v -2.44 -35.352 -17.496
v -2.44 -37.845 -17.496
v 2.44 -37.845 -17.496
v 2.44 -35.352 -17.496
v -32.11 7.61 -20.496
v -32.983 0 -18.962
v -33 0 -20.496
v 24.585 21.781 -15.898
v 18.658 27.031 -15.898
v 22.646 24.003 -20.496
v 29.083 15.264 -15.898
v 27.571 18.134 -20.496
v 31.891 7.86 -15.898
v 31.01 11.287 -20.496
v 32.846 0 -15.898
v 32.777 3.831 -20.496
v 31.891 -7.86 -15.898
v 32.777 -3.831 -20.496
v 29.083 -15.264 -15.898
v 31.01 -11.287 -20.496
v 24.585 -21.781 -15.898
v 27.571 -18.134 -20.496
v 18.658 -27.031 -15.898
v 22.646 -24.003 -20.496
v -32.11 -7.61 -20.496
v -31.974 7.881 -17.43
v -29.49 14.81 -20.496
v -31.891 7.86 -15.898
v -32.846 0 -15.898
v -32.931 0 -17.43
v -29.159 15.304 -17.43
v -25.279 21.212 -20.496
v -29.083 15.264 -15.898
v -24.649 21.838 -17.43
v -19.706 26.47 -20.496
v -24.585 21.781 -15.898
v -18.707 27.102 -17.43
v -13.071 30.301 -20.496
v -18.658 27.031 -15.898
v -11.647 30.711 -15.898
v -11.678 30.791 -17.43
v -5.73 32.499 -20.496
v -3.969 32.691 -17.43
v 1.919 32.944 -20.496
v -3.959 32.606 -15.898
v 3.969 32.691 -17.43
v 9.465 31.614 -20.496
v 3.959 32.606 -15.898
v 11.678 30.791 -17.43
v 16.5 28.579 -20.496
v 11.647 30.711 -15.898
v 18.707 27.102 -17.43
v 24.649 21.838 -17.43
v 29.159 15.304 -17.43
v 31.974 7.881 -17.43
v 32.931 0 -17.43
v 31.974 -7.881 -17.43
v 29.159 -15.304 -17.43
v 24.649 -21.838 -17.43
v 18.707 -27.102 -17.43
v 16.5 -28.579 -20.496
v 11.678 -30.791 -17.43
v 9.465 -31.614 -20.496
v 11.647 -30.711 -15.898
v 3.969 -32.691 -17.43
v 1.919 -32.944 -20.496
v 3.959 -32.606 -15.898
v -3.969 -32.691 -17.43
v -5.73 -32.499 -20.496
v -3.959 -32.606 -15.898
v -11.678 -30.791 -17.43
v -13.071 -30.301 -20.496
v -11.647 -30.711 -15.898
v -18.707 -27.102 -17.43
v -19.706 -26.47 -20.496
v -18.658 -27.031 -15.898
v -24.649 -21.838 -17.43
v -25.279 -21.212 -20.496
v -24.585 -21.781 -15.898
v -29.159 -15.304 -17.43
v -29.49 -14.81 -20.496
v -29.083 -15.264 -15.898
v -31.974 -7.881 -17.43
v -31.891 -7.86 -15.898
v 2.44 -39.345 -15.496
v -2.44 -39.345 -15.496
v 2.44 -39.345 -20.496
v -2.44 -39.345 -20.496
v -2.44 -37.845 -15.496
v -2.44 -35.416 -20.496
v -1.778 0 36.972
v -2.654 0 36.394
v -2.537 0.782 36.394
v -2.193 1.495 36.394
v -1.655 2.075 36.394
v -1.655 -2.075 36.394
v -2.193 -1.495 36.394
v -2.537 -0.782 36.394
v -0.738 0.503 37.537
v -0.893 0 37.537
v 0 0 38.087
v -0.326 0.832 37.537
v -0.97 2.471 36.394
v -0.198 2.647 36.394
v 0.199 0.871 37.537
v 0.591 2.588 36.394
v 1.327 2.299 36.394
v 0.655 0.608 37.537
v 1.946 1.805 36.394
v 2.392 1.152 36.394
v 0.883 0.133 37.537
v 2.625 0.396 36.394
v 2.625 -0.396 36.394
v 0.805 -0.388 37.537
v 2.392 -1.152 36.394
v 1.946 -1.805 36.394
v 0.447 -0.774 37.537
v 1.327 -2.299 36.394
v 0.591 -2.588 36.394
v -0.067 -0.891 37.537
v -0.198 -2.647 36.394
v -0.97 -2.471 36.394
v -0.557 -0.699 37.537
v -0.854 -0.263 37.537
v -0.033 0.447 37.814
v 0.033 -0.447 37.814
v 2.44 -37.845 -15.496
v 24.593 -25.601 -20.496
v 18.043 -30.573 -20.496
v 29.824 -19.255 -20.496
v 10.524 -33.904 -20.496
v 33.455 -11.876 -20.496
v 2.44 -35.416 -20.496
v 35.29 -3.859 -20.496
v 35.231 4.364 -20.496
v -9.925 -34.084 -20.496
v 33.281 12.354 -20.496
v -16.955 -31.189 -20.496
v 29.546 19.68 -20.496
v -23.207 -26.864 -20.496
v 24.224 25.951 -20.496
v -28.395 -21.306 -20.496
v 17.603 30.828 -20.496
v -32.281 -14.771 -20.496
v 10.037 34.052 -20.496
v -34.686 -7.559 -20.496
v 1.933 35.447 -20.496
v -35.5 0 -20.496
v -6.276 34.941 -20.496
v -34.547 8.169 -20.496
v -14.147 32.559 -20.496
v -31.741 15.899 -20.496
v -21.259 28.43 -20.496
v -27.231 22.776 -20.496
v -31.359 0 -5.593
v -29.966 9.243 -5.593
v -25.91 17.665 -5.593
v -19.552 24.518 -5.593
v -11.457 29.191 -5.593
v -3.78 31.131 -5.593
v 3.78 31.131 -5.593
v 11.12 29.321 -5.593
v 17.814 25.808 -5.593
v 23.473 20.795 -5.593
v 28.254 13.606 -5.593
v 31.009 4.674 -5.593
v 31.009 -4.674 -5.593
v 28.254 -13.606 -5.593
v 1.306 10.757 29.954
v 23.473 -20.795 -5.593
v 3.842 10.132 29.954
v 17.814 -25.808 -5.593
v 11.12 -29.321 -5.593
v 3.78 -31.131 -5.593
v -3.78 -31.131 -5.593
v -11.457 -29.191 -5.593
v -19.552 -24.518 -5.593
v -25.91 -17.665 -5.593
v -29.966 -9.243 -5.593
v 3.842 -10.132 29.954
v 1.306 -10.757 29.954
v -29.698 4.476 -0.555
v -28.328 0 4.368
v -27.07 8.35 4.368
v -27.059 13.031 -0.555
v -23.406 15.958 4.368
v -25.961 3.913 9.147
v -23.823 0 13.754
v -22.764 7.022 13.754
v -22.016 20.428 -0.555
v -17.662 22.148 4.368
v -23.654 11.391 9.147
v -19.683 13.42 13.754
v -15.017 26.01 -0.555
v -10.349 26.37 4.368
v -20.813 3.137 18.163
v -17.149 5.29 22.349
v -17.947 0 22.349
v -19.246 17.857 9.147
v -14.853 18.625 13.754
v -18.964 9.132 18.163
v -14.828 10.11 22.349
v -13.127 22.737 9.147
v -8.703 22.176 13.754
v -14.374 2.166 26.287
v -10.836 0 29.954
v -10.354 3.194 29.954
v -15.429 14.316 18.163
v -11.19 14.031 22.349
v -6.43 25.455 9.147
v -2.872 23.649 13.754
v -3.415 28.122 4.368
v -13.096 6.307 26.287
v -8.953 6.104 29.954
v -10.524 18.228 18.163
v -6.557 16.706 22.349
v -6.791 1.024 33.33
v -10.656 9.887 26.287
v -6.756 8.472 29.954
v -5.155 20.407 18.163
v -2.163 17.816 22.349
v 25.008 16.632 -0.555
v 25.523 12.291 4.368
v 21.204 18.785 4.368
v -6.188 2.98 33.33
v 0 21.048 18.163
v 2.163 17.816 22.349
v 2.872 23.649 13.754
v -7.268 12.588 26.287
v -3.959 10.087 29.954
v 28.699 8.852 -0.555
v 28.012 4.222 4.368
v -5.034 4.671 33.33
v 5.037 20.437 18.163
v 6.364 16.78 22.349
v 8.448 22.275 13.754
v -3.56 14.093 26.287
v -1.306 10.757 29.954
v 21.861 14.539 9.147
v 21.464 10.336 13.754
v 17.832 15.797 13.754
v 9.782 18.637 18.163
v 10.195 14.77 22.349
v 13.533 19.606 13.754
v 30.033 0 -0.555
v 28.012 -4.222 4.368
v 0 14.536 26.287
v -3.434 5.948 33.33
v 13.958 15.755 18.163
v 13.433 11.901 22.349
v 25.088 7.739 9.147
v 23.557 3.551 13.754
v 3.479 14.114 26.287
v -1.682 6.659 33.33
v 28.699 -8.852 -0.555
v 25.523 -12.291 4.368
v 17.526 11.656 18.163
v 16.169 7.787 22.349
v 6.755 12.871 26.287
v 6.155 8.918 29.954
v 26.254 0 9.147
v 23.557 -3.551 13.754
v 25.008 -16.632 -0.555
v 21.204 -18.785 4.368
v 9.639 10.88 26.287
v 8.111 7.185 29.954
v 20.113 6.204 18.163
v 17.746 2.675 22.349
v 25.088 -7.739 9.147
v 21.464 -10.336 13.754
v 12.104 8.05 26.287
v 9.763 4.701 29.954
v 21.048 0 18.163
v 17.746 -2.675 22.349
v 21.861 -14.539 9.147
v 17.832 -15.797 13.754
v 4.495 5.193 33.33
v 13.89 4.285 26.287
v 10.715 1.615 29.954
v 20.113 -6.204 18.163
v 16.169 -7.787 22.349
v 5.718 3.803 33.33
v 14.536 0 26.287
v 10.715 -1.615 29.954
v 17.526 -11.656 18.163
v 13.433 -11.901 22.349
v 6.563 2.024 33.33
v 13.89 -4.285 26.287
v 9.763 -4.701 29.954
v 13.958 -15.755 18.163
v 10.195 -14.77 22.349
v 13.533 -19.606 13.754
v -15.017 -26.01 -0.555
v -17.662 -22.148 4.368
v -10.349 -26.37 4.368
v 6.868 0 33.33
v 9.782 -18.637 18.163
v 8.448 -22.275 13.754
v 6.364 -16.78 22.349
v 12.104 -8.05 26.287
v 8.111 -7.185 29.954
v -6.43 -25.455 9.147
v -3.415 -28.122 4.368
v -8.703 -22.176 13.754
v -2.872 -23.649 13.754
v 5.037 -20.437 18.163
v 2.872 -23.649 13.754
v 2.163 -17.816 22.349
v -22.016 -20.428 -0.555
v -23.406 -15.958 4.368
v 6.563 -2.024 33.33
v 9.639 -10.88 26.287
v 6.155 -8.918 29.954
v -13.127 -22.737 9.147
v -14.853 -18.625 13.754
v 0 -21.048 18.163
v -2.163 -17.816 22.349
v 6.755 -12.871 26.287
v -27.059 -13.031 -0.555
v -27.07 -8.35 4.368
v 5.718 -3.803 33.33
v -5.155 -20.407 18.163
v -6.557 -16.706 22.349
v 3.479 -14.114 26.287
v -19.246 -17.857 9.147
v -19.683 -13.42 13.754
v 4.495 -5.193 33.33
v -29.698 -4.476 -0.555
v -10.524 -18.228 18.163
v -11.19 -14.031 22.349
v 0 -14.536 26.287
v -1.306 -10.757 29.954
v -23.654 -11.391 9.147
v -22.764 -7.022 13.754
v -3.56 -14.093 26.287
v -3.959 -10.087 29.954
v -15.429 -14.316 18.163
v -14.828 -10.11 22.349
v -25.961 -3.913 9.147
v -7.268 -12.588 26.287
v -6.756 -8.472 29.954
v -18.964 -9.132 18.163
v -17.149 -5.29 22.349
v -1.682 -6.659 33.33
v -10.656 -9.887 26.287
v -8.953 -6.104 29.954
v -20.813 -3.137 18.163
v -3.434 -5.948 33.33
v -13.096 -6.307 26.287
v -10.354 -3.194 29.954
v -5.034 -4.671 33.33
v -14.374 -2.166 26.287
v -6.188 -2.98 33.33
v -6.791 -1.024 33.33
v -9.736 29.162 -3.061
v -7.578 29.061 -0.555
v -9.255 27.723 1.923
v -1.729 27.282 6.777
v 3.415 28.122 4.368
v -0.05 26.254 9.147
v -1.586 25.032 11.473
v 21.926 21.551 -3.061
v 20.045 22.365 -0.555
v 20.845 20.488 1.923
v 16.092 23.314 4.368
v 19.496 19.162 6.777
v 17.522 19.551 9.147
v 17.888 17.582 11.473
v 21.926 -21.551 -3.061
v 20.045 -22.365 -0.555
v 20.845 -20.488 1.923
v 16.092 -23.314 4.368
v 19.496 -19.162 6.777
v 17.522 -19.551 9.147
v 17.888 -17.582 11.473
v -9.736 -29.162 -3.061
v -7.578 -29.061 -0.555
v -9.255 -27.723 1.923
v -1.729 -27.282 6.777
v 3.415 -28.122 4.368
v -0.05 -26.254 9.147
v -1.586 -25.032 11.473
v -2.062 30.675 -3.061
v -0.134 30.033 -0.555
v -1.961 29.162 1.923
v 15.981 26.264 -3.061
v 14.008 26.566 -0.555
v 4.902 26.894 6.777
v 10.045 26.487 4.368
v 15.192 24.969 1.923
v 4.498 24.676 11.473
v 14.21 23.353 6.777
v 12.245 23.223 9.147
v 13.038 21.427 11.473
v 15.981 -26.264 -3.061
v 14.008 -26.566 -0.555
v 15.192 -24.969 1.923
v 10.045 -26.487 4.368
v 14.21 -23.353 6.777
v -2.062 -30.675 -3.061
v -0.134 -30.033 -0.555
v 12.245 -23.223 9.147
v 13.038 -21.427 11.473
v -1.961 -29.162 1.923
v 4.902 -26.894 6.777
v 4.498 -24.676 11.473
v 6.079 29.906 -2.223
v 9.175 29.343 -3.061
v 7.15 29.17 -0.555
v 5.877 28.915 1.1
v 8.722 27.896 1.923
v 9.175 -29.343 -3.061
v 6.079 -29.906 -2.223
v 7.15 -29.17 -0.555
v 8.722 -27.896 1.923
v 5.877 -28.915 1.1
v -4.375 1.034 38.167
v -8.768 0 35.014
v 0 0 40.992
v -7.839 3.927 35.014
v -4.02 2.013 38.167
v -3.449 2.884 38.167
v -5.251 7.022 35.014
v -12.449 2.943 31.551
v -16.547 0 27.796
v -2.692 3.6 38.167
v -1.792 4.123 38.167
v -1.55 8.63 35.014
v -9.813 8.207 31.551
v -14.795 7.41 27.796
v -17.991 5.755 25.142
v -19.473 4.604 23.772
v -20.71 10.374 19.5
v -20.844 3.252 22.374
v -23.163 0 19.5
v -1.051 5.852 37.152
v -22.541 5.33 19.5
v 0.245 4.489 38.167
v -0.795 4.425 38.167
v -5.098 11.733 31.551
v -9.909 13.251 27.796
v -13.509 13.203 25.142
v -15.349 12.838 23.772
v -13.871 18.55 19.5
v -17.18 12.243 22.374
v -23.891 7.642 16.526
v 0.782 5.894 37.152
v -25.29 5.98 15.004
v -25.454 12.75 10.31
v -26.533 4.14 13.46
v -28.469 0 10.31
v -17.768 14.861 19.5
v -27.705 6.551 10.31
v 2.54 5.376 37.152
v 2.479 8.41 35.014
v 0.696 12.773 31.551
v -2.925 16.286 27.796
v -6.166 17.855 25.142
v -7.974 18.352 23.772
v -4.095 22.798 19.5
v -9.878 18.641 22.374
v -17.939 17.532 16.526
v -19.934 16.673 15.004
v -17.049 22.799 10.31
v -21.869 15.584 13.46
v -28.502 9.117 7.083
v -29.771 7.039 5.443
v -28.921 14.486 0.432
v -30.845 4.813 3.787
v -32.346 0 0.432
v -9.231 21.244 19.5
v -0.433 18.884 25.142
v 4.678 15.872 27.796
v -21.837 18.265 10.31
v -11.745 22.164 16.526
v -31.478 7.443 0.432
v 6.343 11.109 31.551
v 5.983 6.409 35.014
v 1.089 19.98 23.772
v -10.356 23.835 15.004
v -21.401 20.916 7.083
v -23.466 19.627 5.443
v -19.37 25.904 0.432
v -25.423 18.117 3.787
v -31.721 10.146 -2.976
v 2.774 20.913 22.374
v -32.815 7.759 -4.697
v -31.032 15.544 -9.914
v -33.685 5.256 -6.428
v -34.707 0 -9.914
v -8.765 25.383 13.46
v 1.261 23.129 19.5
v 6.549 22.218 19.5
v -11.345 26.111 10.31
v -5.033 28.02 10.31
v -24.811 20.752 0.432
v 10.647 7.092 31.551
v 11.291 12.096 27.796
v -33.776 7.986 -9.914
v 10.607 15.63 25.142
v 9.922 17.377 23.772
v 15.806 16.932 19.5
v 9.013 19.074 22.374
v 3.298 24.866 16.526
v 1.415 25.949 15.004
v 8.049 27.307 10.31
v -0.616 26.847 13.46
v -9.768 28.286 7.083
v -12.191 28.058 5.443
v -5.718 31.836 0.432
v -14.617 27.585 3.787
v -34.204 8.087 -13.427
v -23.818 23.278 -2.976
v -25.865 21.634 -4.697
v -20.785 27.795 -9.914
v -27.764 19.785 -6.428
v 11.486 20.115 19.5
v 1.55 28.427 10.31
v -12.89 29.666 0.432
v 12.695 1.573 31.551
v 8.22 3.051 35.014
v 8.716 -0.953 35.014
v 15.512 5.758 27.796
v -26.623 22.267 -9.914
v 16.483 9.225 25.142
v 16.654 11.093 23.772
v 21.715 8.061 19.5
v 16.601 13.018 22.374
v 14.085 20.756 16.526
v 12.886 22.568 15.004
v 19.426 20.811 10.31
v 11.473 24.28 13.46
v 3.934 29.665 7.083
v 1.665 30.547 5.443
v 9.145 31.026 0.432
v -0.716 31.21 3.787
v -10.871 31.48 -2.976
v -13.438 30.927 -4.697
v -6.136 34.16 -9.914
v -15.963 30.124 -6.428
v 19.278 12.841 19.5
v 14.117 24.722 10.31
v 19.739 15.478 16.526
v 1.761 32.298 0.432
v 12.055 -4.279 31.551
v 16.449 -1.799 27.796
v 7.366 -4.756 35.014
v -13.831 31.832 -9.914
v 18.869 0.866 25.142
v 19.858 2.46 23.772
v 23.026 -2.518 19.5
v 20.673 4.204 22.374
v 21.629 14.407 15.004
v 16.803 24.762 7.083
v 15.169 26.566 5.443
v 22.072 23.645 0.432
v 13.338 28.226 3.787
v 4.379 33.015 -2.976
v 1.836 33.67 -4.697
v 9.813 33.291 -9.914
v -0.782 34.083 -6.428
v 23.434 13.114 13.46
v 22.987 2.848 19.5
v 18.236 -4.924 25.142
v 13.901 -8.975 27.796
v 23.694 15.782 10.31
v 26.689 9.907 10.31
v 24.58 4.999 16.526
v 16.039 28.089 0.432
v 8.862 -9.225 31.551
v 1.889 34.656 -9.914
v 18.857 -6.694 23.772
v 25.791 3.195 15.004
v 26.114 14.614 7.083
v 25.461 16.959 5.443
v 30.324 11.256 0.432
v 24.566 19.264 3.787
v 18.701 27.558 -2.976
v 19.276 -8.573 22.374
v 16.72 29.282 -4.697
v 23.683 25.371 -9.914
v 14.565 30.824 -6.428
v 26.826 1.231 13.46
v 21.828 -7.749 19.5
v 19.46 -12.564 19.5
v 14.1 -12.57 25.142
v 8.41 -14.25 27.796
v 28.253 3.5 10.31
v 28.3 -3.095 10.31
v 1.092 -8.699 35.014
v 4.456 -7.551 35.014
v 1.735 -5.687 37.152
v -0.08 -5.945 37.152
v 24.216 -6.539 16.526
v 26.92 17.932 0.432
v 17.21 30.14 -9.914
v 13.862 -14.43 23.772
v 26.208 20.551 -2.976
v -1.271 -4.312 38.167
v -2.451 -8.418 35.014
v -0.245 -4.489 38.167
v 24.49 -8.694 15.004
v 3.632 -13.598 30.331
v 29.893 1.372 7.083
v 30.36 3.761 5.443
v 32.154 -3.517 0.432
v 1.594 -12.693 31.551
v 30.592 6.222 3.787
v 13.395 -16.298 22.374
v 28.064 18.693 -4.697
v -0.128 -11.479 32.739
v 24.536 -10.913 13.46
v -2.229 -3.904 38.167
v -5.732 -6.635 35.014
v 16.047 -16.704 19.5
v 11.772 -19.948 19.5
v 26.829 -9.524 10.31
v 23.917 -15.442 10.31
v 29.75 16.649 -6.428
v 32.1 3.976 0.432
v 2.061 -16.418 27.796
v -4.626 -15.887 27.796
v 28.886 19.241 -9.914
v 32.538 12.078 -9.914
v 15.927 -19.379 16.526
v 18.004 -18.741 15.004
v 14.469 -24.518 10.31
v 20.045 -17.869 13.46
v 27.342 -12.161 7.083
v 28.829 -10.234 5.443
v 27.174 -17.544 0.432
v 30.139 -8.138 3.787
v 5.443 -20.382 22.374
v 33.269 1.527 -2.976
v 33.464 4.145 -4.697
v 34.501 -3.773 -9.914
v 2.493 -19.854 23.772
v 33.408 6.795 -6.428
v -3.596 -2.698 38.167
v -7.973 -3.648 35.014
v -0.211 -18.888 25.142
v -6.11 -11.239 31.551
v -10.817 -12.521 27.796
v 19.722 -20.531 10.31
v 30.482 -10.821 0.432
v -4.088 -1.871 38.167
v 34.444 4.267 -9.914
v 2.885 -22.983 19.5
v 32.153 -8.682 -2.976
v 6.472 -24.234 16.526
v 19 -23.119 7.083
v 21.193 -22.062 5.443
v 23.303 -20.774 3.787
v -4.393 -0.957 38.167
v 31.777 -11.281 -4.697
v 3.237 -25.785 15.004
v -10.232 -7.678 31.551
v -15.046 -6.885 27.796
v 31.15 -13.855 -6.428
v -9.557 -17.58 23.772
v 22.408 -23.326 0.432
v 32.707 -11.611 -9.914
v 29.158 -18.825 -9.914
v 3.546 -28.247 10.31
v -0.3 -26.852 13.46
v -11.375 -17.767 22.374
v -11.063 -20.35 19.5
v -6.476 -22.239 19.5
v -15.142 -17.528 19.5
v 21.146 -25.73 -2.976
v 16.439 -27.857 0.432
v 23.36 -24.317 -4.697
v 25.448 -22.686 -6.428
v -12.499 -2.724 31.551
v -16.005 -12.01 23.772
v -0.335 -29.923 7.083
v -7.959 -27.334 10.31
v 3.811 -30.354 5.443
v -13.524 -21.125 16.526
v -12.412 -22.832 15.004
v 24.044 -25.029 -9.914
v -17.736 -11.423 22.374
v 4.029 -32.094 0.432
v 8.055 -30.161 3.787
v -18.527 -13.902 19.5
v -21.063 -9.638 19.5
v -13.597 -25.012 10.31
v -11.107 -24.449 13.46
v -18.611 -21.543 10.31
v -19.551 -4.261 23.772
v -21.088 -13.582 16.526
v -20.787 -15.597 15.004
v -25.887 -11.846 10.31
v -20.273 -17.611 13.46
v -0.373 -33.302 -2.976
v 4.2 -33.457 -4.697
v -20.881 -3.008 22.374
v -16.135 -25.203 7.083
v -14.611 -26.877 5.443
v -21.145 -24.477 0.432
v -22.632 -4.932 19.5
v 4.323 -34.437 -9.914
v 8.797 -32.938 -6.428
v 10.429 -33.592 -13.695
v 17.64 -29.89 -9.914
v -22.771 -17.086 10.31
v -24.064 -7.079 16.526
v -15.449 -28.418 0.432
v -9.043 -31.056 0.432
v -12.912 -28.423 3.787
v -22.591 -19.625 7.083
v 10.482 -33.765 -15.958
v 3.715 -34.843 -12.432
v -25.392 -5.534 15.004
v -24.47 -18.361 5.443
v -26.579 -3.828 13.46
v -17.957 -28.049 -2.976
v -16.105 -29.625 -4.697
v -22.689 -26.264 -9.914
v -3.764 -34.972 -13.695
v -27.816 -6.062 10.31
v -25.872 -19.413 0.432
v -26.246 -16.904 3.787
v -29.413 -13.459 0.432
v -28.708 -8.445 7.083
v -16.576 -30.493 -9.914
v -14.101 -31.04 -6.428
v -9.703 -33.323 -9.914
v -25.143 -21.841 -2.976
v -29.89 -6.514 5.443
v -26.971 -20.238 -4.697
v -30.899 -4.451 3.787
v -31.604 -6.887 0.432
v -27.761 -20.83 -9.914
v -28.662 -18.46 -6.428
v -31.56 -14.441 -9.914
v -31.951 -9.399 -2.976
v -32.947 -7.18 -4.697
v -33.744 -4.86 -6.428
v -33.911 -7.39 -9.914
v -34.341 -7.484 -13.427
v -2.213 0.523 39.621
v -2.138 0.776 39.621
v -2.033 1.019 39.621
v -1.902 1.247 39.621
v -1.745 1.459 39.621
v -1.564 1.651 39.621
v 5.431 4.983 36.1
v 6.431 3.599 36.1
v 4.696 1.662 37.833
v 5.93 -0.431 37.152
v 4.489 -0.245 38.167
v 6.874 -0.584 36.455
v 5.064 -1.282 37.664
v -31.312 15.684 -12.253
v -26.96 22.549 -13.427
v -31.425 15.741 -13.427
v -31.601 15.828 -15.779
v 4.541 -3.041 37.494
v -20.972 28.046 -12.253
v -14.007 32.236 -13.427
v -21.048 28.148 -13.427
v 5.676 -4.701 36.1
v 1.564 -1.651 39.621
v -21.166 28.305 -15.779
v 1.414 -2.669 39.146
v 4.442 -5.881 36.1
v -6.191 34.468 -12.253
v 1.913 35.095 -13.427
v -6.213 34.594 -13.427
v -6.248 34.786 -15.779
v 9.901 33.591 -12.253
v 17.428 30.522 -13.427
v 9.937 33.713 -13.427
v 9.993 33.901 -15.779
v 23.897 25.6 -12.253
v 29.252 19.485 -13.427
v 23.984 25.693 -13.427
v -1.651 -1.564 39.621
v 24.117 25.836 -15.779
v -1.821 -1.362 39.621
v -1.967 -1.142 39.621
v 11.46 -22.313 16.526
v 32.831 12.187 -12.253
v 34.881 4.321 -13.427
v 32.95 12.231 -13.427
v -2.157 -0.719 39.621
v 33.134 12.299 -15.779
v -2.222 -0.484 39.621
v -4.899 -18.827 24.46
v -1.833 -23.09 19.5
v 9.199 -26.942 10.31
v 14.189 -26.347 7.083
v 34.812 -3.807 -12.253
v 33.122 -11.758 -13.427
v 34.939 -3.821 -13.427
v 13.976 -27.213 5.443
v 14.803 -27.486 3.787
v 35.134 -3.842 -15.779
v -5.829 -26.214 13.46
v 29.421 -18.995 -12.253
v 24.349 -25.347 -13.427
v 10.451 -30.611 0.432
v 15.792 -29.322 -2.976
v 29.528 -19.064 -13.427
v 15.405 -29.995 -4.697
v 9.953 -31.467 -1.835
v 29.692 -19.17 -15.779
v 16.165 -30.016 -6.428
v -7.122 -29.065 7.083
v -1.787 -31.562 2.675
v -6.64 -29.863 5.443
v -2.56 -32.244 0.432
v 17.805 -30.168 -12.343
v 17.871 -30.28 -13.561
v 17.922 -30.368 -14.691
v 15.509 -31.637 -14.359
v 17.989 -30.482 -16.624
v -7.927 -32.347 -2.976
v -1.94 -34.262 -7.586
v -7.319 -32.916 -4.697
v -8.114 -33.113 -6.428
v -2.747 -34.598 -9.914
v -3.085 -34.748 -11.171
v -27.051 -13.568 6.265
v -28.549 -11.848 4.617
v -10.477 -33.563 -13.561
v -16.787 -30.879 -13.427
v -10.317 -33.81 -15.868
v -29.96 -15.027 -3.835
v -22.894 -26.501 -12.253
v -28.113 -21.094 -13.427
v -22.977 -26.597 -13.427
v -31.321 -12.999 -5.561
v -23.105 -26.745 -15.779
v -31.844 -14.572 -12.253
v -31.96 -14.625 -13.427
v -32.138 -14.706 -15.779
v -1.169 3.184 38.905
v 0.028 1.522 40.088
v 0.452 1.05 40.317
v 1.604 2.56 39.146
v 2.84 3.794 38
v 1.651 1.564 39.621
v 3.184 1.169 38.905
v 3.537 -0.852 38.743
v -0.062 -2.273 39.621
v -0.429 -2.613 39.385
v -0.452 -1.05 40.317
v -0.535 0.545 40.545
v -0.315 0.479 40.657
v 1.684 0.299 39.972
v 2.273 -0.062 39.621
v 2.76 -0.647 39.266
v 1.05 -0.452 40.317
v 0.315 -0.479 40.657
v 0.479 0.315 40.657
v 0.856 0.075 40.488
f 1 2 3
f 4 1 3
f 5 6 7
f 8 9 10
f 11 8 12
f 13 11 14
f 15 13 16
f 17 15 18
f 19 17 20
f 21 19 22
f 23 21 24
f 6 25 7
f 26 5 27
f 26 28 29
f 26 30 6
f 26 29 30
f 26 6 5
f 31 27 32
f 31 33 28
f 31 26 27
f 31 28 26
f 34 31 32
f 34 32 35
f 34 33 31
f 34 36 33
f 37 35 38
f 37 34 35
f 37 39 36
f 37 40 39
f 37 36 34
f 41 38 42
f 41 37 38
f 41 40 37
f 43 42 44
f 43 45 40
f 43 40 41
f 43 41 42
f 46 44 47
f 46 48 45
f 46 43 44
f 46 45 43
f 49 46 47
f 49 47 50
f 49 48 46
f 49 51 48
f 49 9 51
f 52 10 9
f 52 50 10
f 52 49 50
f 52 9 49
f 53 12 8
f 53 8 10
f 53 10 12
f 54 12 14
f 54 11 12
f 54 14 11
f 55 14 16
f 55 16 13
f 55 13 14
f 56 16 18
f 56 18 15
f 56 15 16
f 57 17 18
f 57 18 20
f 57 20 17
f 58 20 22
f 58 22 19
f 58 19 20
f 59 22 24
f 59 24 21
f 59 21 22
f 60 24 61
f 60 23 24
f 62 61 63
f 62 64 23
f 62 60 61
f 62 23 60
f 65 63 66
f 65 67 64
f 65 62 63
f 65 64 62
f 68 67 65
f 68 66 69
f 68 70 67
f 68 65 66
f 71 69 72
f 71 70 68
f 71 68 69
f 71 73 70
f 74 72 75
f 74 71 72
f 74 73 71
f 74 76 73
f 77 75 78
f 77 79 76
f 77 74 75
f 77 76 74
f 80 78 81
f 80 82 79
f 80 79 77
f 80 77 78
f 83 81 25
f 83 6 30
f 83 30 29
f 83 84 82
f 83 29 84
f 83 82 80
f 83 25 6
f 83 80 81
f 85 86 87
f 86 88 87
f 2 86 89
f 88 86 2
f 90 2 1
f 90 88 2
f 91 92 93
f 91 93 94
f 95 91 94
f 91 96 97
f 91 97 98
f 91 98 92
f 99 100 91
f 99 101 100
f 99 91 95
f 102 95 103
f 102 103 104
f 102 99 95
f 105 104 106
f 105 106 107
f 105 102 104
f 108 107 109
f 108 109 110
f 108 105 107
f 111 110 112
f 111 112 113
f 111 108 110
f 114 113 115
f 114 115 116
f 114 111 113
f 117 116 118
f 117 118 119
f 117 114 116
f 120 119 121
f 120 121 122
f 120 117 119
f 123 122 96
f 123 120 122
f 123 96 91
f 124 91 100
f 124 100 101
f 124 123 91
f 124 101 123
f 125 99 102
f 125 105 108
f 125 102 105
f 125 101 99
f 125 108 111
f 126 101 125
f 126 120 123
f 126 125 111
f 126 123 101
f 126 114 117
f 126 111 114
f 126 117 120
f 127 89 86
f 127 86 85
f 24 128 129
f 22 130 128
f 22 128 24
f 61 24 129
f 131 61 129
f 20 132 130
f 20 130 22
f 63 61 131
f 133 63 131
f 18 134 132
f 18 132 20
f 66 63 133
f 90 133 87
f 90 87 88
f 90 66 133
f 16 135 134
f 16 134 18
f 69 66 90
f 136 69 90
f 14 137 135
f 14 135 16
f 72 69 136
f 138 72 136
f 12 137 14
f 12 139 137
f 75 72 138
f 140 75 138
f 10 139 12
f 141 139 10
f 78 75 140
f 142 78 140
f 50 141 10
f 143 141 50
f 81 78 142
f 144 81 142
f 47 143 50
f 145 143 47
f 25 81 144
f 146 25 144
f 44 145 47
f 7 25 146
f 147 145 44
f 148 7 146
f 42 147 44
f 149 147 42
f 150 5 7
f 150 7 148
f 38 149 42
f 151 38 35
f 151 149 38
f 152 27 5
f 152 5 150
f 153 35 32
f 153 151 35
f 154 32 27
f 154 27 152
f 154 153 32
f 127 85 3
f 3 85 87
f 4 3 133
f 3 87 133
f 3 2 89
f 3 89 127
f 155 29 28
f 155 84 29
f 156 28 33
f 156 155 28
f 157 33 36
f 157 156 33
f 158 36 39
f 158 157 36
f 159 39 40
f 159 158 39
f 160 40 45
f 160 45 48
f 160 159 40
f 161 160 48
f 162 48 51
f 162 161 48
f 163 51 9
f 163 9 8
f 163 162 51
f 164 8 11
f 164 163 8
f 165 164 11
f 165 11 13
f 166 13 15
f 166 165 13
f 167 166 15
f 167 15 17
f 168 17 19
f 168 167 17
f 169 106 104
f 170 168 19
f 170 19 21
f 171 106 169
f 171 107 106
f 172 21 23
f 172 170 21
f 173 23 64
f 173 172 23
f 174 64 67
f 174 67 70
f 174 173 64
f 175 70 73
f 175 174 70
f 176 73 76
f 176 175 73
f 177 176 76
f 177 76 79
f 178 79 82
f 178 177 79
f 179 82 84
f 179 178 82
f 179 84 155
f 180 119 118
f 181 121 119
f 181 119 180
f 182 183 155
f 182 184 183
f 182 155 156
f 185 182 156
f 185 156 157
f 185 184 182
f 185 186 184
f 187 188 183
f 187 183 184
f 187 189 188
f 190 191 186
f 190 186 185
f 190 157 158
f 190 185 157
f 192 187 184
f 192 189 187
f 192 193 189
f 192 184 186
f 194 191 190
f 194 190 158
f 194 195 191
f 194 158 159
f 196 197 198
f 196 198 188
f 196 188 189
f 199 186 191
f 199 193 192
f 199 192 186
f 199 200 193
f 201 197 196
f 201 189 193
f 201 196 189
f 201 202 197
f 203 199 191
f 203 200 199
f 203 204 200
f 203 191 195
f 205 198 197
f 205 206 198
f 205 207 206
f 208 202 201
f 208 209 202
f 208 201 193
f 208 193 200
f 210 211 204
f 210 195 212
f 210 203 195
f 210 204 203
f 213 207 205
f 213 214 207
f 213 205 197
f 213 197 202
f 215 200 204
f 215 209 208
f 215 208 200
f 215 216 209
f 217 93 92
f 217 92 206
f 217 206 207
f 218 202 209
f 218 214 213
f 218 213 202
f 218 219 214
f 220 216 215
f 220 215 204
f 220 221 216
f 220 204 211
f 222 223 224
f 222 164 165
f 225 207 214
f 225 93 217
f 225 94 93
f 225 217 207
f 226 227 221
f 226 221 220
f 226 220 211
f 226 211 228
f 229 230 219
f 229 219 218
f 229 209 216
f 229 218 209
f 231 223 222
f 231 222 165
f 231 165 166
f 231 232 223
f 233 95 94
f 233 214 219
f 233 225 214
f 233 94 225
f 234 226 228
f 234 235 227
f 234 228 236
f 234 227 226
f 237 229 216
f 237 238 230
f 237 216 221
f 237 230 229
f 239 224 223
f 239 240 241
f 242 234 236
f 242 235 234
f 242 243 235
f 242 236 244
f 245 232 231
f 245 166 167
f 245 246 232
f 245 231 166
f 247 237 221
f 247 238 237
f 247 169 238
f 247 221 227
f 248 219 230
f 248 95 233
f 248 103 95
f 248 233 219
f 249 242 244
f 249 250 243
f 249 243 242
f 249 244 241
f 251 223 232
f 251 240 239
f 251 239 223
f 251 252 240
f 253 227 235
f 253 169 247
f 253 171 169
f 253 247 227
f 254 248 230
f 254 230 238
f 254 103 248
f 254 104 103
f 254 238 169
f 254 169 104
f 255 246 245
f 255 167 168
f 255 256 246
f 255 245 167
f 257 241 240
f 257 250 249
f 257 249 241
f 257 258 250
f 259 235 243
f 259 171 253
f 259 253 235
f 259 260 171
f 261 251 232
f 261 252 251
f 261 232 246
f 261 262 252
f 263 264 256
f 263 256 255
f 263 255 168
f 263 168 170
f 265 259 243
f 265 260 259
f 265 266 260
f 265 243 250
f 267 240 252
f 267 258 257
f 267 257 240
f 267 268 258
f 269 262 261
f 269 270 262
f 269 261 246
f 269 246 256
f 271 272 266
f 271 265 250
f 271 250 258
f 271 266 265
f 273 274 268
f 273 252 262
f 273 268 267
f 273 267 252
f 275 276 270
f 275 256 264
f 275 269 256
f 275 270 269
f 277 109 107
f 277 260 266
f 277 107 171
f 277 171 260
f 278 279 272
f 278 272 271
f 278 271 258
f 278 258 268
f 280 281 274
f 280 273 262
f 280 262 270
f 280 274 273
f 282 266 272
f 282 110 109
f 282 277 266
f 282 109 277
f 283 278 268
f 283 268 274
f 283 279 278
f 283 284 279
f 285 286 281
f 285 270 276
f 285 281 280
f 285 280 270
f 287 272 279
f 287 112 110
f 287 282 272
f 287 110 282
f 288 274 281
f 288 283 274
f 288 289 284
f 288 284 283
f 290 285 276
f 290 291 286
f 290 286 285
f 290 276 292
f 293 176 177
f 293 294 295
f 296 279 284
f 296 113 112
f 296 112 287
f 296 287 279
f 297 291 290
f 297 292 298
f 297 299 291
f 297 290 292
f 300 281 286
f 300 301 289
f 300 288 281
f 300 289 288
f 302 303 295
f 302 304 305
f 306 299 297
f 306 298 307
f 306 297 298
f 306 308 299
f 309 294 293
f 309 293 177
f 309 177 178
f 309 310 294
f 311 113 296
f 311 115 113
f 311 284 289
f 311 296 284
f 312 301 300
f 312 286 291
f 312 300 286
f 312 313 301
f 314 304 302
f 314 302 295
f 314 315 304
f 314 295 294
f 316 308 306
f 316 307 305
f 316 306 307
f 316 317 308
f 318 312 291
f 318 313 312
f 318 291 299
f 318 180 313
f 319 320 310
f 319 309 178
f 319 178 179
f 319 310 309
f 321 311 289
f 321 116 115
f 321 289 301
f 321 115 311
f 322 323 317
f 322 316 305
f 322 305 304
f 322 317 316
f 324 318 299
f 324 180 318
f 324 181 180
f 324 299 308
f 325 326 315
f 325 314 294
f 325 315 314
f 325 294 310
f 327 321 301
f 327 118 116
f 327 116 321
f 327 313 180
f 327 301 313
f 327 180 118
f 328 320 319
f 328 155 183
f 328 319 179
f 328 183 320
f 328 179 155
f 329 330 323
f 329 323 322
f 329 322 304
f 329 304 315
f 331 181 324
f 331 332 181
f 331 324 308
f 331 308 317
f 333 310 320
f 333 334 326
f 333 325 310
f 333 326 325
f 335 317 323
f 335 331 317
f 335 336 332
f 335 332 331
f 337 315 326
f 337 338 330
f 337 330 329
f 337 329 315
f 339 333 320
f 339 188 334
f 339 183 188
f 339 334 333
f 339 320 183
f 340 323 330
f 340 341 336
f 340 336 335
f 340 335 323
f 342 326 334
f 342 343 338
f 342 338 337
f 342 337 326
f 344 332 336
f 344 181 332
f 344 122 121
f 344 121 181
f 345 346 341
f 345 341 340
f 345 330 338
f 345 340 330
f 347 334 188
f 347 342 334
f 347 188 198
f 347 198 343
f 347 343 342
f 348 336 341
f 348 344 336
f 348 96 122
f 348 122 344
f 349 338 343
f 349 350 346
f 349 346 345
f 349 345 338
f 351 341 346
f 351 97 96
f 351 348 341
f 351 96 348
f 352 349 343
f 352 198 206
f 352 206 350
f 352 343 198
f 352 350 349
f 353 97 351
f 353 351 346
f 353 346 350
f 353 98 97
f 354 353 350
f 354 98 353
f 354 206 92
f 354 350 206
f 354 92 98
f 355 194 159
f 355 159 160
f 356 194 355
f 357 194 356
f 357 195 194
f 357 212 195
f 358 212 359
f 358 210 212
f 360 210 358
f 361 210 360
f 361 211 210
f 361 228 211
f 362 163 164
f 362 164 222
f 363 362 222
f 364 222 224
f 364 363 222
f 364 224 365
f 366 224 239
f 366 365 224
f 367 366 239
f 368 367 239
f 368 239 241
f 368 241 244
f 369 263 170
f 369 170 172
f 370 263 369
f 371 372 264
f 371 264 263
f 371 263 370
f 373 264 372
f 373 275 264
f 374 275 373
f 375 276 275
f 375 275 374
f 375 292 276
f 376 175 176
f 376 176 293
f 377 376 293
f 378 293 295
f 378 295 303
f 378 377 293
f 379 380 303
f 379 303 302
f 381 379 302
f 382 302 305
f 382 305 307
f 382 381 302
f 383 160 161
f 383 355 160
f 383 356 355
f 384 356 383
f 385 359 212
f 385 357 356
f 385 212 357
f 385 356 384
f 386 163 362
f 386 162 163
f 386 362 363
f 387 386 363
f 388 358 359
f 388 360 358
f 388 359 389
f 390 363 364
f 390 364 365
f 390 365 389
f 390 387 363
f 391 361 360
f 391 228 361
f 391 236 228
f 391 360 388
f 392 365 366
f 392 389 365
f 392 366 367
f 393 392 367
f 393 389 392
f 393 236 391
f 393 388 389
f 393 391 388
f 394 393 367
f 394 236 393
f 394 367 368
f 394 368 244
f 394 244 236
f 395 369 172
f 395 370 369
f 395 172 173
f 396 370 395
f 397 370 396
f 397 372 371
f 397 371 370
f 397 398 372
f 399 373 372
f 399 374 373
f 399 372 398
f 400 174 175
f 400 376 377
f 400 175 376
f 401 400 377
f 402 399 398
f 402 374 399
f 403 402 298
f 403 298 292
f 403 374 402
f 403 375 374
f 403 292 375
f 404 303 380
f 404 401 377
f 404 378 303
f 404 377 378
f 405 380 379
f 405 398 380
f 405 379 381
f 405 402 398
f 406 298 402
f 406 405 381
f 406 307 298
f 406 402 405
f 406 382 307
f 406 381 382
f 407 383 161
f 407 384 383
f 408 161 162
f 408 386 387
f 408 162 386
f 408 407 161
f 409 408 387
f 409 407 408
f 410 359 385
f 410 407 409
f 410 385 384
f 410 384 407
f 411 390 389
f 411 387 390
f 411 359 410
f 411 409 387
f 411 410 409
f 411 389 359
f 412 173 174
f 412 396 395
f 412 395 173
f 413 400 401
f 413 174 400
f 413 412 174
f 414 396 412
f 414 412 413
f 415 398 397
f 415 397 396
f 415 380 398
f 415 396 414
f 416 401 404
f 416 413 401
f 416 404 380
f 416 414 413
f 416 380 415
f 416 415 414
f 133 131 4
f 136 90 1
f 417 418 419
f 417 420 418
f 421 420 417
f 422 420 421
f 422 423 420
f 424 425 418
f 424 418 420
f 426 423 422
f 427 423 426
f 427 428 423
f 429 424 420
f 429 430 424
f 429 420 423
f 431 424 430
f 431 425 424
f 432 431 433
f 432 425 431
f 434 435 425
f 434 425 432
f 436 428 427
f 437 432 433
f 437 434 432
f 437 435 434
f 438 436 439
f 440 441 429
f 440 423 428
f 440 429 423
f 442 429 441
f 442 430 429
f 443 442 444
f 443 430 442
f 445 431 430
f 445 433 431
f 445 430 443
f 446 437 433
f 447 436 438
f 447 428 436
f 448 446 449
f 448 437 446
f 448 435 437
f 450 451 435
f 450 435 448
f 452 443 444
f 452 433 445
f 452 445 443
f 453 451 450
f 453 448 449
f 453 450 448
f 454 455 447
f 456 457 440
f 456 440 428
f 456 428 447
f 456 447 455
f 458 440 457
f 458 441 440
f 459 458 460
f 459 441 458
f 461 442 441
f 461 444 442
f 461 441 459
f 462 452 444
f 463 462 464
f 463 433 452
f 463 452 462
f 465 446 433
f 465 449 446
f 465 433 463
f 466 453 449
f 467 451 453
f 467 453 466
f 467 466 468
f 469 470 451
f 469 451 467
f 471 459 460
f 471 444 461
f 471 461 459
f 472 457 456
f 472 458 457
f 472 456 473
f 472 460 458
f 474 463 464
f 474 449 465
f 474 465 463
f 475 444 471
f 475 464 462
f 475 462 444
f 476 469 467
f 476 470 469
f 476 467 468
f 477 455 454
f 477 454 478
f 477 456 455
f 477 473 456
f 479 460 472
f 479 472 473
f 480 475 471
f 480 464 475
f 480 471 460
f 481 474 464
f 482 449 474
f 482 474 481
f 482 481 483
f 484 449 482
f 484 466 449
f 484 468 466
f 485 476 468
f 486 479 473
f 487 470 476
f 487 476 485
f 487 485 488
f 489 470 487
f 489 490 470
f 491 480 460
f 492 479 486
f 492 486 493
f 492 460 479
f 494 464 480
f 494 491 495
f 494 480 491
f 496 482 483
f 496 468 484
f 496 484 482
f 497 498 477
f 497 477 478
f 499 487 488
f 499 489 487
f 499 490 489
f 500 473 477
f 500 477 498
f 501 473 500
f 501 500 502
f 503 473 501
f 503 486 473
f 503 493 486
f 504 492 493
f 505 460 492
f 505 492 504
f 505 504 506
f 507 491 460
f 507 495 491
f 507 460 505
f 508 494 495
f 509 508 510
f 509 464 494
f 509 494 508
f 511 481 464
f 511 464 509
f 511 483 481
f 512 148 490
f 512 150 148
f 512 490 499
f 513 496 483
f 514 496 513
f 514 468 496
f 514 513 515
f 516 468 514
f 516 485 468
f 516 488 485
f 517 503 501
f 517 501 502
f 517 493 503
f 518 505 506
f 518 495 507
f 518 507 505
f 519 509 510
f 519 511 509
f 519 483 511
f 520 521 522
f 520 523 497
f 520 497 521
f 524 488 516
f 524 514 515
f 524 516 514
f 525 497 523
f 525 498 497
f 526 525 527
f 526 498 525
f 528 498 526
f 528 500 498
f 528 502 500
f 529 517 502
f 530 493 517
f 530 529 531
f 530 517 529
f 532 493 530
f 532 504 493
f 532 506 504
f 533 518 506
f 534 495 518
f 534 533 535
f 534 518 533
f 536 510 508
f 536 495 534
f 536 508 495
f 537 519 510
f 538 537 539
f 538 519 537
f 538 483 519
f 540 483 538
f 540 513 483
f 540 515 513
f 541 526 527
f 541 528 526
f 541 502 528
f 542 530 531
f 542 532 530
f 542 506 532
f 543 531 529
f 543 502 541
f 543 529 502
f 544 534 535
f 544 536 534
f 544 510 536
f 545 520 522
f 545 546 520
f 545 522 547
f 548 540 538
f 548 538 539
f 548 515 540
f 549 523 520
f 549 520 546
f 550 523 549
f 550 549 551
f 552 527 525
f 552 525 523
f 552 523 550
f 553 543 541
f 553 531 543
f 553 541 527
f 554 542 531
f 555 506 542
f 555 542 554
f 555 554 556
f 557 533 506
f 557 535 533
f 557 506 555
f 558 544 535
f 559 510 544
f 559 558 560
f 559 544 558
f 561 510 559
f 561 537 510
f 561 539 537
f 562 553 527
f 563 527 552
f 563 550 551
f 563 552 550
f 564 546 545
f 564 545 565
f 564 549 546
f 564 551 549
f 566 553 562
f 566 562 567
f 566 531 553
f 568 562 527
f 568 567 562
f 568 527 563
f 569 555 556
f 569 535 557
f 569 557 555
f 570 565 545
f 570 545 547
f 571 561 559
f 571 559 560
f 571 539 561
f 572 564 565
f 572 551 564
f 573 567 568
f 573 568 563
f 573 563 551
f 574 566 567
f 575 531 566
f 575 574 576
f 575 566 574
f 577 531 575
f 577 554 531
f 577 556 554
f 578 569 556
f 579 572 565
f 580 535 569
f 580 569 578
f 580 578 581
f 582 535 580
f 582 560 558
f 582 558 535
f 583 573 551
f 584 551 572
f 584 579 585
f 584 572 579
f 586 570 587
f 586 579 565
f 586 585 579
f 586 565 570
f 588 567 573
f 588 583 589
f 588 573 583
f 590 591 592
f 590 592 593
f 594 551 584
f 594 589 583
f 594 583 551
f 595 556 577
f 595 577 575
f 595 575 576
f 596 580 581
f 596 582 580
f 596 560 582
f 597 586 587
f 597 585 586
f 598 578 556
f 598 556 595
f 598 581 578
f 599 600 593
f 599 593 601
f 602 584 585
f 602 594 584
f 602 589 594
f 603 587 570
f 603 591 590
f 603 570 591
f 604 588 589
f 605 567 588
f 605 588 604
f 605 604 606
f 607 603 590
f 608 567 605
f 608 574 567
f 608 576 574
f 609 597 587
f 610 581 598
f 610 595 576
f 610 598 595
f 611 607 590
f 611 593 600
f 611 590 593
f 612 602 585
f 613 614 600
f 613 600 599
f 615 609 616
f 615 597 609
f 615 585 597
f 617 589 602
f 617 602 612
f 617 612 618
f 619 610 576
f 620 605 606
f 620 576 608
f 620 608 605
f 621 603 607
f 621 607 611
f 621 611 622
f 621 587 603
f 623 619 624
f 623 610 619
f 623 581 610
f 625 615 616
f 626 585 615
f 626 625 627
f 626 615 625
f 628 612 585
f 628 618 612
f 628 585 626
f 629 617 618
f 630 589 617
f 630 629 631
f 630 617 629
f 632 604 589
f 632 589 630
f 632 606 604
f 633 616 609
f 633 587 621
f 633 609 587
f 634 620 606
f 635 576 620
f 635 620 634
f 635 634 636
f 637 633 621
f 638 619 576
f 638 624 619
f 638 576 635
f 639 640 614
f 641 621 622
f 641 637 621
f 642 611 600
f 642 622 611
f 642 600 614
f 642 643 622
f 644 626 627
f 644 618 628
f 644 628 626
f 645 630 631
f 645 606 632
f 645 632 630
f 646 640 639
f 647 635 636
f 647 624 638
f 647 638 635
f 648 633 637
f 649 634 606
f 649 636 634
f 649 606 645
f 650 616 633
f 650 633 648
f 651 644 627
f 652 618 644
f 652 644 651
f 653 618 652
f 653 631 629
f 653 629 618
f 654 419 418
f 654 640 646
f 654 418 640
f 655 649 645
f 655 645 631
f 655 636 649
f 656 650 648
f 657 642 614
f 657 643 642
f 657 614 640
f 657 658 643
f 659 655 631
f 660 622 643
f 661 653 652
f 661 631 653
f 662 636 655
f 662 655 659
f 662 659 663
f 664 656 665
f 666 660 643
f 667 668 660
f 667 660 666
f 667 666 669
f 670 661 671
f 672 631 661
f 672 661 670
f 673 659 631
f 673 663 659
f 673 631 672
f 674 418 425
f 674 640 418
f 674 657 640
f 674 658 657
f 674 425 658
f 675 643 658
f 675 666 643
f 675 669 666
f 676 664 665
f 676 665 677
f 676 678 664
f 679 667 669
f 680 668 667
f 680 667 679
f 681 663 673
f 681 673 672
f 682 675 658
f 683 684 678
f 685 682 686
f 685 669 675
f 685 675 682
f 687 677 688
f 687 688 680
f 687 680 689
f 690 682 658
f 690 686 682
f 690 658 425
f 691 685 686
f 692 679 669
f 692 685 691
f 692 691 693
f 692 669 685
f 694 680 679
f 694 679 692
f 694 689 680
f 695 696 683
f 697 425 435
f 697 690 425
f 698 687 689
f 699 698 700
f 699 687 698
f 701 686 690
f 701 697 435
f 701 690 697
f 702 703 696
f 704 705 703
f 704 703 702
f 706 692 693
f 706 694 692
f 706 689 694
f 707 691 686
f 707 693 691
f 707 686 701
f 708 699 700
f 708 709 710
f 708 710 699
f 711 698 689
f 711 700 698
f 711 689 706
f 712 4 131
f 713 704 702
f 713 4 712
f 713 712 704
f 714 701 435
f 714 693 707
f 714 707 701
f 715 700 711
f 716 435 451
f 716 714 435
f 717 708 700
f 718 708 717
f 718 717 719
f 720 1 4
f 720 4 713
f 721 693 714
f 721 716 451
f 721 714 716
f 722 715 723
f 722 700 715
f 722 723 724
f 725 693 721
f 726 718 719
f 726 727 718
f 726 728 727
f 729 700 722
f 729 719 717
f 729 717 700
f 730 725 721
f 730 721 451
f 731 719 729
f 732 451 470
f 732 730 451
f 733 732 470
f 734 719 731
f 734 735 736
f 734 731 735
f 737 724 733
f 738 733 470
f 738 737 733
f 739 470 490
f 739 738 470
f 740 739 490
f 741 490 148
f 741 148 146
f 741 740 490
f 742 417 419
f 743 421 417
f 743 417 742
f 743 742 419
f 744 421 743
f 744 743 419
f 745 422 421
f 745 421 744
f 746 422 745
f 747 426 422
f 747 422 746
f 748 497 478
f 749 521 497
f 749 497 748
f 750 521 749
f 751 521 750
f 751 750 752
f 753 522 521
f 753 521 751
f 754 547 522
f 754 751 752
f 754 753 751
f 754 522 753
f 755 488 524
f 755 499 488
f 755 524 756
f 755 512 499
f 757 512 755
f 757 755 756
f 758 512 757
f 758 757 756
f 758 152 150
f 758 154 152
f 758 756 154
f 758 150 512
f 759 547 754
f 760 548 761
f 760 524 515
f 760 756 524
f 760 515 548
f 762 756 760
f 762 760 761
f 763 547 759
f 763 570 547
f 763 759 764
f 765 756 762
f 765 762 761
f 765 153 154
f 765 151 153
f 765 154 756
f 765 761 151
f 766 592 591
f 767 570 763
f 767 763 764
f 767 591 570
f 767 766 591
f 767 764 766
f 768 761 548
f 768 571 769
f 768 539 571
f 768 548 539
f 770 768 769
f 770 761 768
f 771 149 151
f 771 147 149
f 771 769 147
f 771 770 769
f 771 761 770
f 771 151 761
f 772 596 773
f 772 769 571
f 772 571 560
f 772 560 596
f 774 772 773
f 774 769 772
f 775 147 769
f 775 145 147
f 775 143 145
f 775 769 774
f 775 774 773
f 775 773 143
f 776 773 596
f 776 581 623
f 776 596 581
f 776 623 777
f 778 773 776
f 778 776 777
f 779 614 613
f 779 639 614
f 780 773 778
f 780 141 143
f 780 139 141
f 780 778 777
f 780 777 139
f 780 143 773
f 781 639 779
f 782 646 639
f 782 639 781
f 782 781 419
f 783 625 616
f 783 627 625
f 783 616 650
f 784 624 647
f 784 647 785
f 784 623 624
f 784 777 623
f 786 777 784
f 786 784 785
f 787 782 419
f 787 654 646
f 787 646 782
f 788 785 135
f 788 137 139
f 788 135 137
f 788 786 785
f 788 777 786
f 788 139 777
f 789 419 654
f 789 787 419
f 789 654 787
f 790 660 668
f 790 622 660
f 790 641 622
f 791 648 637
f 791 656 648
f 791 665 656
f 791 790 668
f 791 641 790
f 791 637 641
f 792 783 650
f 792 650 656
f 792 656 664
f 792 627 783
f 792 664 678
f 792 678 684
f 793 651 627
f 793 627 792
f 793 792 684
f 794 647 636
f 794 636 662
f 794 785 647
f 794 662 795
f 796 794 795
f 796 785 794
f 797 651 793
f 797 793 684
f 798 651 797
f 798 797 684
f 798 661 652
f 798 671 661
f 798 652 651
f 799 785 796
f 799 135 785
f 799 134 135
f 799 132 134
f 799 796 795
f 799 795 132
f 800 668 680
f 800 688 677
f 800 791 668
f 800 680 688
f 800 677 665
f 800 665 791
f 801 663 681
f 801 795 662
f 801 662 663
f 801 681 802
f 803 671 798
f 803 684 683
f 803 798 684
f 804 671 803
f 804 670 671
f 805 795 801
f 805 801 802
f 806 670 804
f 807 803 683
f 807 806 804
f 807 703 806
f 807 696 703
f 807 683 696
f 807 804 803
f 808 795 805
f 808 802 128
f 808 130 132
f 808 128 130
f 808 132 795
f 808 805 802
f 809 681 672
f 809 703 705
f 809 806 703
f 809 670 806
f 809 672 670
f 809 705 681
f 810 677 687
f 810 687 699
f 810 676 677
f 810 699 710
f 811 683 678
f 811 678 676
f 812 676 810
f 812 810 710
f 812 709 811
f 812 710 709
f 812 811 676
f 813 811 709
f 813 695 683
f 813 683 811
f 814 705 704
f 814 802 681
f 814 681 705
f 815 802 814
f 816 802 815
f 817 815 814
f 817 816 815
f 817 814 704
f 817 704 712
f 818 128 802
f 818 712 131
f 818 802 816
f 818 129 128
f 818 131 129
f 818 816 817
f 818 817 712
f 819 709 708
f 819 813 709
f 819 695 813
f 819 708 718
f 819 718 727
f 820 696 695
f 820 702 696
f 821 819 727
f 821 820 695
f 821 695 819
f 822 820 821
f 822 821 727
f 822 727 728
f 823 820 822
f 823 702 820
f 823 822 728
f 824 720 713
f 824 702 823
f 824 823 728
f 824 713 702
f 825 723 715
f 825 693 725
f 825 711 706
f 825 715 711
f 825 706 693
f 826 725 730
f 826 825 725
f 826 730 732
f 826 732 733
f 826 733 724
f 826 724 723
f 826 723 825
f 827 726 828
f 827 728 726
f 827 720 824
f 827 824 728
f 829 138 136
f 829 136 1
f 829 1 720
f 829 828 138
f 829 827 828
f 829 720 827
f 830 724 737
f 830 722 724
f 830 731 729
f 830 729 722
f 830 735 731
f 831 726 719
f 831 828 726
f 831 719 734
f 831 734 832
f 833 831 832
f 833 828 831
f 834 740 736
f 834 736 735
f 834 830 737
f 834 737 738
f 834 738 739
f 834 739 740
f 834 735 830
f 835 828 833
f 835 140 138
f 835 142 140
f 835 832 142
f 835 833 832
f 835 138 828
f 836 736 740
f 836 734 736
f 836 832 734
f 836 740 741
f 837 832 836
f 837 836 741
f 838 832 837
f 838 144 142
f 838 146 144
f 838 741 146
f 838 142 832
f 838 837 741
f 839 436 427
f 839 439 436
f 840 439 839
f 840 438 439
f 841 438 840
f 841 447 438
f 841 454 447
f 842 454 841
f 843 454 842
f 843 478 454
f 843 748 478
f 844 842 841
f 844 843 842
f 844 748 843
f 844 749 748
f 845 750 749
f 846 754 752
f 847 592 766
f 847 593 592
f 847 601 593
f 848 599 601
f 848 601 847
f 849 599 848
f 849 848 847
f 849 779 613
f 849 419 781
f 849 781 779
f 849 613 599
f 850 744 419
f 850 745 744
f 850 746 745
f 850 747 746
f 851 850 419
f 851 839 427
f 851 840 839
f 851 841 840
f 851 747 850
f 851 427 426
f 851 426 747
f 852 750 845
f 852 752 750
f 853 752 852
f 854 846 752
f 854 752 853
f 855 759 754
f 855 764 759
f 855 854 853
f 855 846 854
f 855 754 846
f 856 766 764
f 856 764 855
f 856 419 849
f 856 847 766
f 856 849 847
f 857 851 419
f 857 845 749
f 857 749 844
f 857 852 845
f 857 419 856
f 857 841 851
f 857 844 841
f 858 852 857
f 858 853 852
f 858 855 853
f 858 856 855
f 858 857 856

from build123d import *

# Parameters (mm, degrees)
F3_DEPTH = 3
F4_W     = 4.87966
F4_H     = 1.5
F5_DEPTH = 2


with BuildPart() as f1:
    # F0 (on Front) → F1 (revolve)
    with BuildSketch(Plane.XZ):
        with BuildLine():
            ThreePointArc((0, 40.991869), (-25.987804, 15.004065), (-35.5, -20.495935))
            Line((-35.5, -20.495935), (-32.845529, -15.898256))
            ThreePointArc((-32.845529, -15.898256), (-23.82274, 13.754065), (-2.654471, 36.394191))
            Line((-2.654471, 36.394191), (0, 40.991869))
        make_face()
        with BuildLine():
            Line((-35.5, -20.495935), (-33, -20.495935))
            ThreePointArc((-33, -20.495935), (-32.961371, -18.195798), (-32.845529, -15.898256))
            Line((-32.845529, -15.898256), (-35.5, -20.495935))
        make_face()
        with BuildLine():
            ThreePointArc((-2.654471, 36.394191), (-1.336965, 37.256018), (0, 38.08734))
            Line((0, 38.08734), (0, 40.991869))
            Line((0, 40.991869), (-2.654471, 36.394191))
        make_face()
    revolve(axis=Axis((0, 0, 10.247967), (0, 0, -1)))

    # F2 (on face) → F3 (join)
    with BuildSketch(Plane(origin=(0, 0, -20.495935), x_dir=(1, 0, 0), z_dir=(0, 0, -1))):
        with BuildLine():
            Line((2.43983, 34.345327), (2.43983, 39.345327))
            Line((2.43983, 39.345327), (-2.43983, 39.345327))
            Line((-2.43983, 39.345327), (-2.43983, 34.345327))
            ThreePointArc((-2.43983, 34.345327), (-1.220683, 34.410234), (0, 34.431879))
            ThreePointArc((0, 34.431879), (1.220683, 34.410234), (2.43983, 34.345327))
        make_face()
    extrude(amount=-F3_DEPTH)

    # F4 (on face) → F5 (join)
    with BuildSketch(Plane.XY.offset(-17.495935)):
        with Locations((0, -38.595327)):
            Rectangle(F4_W, F4_H)
    extrude(amount=F5_DEPTH)


solid = f1.part
